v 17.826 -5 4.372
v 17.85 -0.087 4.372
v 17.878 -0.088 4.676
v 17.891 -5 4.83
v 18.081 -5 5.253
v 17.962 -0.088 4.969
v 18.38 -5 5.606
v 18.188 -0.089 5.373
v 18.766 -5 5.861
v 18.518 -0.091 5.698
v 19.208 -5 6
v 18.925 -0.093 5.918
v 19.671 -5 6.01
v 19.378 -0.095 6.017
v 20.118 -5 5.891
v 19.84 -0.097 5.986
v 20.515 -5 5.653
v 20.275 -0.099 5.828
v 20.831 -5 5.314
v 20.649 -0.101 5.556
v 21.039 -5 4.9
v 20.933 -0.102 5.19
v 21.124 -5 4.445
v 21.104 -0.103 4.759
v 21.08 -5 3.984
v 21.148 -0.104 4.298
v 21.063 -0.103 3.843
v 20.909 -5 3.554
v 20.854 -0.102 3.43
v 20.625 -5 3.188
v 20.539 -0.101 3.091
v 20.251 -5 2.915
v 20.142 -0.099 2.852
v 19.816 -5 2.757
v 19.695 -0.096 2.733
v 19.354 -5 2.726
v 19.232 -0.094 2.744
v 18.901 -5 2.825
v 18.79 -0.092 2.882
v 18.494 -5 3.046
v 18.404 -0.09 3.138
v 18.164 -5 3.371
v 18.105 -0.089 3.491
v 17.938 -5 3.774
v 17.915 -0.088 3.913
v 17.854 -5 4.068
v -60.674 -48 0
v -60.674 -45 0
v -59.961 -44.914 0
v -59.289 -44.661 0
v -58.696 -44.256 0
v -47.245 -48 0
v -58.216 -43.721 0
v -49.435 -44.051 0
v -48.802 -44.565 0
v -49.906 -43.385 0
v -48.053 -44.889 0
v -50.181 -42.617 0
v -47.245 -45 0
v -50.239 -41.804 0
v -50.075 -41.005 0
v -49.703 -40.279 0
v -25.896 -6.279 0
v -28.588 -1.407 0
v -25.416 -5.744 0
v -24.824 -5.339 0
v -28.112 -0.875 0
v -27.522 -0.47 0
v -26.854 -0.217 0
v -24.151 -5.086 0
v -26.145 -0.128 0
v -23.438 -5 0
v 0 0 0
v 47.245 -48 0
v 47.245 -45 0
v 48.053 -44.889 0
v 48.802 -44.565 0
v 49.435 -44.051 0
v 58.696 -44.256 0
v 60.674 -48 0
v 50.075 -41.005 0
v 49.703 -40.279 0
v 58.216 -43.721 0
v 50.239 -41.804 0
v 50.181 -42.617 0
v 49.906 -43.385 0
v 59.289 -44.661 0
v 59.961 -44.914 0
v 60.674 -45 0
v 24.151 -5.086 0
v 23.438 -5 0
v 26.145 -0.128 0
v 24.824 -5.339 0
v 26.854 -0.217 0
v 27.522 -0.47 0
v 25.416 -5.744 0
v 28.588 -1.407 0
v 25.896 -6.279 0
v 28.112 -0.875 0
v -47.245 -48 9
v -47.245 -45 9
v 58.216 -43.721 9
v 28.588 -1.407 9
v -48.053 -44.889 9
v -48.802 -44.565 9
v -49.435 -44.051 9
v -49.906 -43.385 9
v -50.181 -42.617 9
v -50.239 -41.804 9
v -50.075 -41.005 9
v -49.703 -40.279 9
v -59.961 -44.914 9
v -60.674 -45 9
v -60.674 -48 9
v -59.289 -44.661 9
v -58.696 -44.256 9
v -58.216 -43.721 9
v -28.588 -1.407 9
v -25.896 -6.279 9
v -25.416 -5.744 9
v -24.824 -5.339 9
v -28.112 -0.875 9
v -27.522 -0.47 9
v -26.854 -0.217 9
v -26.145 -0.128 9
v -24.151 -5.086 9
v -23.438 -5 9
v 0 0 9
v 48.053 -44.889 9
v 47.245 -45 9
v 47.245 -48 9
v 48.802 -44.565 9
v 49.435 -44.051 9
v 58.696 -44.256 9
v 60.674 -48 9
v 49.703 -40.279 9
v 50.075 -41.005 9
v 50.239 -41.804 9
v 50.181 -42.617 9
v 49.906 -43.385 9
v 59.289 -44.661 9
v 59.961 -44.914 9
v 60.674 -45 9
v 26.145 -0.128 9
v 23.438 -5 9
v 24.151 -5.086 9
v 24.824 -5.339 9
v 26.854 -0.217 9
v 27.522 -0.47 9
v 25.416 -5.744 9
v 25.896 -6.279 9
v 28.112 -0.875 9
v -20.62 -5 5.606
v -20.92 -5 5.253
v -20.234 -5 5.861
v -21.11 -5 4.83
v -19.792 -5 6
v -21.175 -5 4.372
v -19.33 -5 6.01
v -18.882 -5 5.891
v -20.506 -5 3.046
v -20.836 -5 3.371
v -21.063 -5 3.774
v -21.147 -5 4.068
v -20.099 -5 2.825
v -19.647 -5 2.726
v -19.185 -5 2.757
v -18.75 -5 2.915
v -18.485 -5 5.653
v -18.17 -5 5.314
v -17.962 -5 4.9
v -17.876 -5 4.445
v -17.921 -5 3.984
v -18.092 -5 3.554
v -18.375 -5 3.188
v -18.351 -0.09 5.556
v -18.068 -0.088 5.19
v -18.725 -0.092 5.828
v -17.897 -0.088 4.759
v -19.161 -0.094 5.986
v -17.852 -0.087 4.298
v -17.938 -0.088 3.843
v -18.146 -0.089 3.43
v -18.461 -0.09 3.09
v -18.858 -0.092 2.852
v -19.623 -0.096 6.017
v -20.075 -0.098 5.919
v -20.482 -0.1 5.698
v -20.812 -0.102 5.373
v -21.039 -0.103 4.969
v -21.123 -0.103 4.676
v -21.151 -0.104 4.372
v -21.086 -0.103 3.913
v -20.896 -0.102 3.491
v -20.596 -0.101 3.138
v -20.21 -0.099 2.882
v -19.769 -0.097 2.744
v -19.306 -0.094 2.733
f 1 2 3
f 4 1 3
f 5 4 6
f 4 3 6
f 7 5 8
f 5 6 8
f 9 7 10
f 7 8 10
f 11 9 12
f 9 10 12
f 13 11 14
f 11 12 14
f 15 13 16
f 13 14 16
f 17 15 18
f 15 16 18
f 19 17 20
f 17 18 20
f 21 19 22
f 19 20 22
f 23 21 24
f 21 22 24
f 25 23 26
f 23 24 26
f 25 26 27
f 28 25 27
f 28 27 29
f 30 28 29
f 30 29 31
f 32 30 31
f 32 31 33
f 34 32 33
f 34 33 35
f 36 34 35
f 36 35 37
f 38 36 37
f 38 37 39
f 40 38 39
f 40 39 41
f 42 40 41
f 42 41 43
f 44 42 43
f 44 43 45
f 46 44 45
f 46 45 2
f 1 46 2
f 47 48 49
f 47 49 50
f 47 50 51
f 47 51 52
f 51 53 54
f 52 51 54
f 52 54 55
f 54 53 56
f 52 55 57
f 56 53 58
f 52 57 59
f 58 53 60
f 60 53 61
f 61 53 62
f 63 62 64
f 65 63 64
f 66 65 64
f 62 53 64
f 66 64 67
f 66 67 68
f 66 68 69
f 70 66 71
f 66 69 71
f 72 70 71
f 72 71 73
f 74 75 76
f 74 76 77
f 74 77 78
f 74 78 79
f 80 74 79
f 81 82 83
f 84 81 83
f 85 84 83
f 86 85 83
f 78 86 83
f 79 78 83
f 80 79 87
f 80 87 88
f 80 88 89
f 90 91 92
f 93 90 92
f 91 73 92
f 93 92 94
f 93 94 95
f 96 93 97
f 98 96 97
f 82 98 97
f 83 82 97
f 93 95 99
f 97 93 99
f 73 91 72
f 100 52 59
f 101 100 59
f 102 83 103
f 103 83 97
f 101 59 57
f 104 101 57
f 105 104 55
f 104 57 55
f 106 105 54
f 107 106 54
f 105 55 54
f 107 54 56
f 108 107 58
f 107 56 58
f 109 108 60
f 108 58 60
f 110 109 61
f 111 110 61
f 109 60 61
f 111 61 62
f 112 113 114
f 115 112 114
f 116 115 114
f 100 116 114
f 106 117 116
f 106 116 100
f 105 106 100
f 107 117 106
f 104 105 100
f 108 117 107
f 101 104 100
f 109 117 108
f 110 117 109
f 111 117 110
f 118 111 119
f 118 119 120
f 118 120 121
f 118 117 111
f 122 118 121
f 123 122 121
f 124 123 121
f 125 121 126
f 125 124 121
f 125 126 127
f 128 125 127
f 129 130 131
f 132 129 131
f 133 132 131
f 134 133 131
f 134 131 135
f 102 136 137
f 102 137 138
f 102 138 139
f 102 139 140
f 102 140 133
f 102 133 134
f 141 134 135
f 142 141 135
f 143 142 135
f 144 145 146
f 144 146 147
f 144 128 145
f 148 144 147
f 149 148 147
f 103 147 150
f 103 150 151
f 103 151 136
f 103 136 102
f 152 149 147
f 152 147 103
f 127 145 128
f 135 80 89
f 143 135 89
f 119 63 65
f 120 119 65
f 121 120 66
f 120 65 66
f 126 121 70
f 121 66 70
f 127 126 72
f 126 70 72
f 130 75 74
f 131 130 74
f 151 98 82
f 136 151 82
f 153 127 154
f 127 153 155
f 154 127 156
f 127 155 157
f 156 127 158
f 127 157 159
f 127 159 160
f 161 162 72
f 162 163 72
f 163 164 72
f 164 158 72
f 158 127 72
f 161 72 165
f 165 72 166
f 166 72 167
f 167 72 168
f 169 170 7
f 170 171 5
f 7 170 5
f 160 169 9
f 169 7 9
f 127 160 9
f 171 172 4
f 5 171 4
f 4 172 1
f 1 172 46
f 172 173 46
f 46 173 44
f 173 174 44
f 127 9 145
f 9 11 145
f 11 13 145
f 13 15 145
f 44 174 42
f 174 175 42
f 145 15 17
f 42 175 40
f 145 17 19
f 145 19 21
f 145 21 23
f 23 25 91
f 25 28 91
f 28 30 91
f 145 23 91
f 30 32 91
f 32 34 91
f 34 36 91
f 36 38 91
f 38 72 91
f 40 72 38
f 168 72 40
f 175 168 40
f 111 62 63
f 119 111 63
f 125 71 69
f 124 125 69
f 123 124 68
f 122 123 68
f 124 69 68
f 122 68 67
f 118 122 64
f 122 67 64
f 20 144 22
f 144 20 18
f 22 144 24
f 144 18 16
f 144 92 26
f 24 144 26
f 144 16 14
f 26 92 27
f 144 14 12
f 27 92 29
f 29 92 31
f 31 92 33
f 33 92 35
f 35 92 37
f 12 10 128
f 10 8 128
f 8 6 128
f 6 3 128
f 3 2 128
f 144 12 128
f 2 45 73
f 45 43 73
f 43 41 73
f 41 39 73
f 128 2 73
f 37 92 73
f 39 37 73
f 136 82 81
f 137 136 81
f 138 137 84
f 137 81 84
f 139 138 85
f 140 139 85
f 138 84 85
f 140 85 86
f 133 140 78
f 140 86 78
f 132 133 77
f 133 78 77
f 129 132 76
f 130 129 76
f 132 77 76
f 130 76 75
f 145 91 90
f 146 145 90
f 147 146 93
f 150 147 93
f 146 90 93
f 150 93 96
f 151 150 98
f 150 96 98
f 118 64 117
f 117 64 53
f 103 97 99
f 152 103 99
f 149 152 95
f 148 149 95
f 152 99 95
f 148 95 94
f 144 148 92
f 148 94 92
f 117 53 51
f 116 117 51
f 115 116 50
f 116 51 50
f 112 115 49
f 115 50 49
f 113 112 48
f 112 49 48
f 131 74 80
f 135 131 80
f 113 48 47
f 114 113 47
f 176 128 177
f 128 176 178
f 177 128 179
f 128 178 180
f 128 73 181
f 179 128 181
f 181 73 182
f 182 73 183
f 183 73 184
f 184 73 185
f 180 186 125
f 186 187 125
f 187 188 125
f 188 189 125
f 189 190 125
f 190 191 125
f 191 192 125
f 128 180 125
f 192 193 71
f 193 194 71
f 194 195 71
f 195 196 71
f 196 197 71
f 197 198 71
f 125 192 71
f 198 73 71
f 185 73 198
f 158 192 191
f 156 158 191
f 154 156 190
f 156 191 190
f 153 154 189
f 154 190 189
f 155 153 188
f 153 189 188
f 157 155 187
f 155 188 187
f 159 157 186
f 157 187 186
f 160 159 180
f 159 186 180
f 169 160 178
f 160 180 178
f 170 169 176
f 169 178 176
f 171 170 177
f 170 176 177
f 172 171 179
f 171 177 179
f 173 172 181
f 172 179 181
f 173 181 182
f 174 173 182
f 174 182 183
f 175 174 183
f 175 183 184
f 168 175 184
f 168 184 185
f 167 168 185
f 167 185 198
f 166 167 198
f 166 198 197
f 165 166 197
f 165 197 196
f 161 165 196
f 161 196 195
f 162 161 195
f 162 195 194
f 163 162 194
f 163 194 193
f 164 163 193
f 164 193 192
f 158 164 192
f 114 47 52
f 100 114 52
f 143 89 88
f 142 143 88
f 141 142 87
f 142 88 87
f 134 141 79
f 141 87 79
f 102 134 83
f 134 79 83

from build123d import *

# Parameters (mm, degrees)
F1_DEPTH = 9
F2_R     = 1.65
F3_DEPTH = 25


with BuildPart() as f1:
    # F0 (on Top) → F1 (new body)
    with BuildSketch(Plane.XY):
        with BuildLine():
            Line((-49.702811, -40.279271), (-25.895755, -6.279271))
            ThreePointArc((-25.895755, -6.279271), (-24.823545, -5.338968), (-23.438299, -5))
            Line((-23.438299, -5), (0, -5))
            Line((0, -5), (23.438299, -5))
            ThreePointArc((23.438299, -5), (24.823545, -5.338968), (25.895755, -6.279271))
            Line((25.895755, -6.279271), (49.702811, -40.279271))
            ThreePointArc((49.702811, -40.279271), (49.906388, -43.385246), (47.245355, -45))
            Line((47.245355, -45), (47.245355, -48))
            Line((47.245355, -48), (60.673876, -48))
            Line((60.673876, -48), (60.673876, -45))
            ThreePointArc((60.673876, -45), (59.28863, -44.661032), (58.216419, -43.720729))
            Line((58.216419, -43.720729), (28.588166, -1.407198))
            ThreePointArc((28.588166, -1.407198), (27.522463, -0.470292), (26.145392, -0.127963))
            Line((26.145392, -0.127963), (0, 0))
            Line((0, 0), (-26.145392, -0.127963))
            ThreePointArc((-26.145392, -0.127963), (-27.522463, -0.470292), (-28.588166, -1.407198))
            Line((-28.588166, -1.407198), (-58.216419, -43.720729))
            ThreePointArc((-58.216419, -43.720729), (-59.28863, -44.661032), (-60.673876, -45))
            Line((-60.673876, -45), (-60.673876, -48))
            Line((-60.673876, -48), (-47.245355, -48))
            Line((-47.245355, -48), (-47.245355, -45))
            ThreePointArc((-47.245355, -45), (-49.906388, -43.385246), (-49.702811, -40.279271))
        make_face()
    extrude(amount=F1_DEPTH)

    # F2 (on face) → F3 (cut)
    with BuildSketch(Plane(origin=(0, 0, 0), x_dir=(-0.999988, 0.004894, 0), z_dir=(0.004894, 0.999988, 0))):
        with Locations((-19.5, 4.371774)):
            Circle(F2_R)
        with Locations((19.5, 4.371774)):
            Circle(F2_R)
    extrude(amount=-F3_DEPTH, mode=Mode.SUBTRACT)


solid = f1.part
